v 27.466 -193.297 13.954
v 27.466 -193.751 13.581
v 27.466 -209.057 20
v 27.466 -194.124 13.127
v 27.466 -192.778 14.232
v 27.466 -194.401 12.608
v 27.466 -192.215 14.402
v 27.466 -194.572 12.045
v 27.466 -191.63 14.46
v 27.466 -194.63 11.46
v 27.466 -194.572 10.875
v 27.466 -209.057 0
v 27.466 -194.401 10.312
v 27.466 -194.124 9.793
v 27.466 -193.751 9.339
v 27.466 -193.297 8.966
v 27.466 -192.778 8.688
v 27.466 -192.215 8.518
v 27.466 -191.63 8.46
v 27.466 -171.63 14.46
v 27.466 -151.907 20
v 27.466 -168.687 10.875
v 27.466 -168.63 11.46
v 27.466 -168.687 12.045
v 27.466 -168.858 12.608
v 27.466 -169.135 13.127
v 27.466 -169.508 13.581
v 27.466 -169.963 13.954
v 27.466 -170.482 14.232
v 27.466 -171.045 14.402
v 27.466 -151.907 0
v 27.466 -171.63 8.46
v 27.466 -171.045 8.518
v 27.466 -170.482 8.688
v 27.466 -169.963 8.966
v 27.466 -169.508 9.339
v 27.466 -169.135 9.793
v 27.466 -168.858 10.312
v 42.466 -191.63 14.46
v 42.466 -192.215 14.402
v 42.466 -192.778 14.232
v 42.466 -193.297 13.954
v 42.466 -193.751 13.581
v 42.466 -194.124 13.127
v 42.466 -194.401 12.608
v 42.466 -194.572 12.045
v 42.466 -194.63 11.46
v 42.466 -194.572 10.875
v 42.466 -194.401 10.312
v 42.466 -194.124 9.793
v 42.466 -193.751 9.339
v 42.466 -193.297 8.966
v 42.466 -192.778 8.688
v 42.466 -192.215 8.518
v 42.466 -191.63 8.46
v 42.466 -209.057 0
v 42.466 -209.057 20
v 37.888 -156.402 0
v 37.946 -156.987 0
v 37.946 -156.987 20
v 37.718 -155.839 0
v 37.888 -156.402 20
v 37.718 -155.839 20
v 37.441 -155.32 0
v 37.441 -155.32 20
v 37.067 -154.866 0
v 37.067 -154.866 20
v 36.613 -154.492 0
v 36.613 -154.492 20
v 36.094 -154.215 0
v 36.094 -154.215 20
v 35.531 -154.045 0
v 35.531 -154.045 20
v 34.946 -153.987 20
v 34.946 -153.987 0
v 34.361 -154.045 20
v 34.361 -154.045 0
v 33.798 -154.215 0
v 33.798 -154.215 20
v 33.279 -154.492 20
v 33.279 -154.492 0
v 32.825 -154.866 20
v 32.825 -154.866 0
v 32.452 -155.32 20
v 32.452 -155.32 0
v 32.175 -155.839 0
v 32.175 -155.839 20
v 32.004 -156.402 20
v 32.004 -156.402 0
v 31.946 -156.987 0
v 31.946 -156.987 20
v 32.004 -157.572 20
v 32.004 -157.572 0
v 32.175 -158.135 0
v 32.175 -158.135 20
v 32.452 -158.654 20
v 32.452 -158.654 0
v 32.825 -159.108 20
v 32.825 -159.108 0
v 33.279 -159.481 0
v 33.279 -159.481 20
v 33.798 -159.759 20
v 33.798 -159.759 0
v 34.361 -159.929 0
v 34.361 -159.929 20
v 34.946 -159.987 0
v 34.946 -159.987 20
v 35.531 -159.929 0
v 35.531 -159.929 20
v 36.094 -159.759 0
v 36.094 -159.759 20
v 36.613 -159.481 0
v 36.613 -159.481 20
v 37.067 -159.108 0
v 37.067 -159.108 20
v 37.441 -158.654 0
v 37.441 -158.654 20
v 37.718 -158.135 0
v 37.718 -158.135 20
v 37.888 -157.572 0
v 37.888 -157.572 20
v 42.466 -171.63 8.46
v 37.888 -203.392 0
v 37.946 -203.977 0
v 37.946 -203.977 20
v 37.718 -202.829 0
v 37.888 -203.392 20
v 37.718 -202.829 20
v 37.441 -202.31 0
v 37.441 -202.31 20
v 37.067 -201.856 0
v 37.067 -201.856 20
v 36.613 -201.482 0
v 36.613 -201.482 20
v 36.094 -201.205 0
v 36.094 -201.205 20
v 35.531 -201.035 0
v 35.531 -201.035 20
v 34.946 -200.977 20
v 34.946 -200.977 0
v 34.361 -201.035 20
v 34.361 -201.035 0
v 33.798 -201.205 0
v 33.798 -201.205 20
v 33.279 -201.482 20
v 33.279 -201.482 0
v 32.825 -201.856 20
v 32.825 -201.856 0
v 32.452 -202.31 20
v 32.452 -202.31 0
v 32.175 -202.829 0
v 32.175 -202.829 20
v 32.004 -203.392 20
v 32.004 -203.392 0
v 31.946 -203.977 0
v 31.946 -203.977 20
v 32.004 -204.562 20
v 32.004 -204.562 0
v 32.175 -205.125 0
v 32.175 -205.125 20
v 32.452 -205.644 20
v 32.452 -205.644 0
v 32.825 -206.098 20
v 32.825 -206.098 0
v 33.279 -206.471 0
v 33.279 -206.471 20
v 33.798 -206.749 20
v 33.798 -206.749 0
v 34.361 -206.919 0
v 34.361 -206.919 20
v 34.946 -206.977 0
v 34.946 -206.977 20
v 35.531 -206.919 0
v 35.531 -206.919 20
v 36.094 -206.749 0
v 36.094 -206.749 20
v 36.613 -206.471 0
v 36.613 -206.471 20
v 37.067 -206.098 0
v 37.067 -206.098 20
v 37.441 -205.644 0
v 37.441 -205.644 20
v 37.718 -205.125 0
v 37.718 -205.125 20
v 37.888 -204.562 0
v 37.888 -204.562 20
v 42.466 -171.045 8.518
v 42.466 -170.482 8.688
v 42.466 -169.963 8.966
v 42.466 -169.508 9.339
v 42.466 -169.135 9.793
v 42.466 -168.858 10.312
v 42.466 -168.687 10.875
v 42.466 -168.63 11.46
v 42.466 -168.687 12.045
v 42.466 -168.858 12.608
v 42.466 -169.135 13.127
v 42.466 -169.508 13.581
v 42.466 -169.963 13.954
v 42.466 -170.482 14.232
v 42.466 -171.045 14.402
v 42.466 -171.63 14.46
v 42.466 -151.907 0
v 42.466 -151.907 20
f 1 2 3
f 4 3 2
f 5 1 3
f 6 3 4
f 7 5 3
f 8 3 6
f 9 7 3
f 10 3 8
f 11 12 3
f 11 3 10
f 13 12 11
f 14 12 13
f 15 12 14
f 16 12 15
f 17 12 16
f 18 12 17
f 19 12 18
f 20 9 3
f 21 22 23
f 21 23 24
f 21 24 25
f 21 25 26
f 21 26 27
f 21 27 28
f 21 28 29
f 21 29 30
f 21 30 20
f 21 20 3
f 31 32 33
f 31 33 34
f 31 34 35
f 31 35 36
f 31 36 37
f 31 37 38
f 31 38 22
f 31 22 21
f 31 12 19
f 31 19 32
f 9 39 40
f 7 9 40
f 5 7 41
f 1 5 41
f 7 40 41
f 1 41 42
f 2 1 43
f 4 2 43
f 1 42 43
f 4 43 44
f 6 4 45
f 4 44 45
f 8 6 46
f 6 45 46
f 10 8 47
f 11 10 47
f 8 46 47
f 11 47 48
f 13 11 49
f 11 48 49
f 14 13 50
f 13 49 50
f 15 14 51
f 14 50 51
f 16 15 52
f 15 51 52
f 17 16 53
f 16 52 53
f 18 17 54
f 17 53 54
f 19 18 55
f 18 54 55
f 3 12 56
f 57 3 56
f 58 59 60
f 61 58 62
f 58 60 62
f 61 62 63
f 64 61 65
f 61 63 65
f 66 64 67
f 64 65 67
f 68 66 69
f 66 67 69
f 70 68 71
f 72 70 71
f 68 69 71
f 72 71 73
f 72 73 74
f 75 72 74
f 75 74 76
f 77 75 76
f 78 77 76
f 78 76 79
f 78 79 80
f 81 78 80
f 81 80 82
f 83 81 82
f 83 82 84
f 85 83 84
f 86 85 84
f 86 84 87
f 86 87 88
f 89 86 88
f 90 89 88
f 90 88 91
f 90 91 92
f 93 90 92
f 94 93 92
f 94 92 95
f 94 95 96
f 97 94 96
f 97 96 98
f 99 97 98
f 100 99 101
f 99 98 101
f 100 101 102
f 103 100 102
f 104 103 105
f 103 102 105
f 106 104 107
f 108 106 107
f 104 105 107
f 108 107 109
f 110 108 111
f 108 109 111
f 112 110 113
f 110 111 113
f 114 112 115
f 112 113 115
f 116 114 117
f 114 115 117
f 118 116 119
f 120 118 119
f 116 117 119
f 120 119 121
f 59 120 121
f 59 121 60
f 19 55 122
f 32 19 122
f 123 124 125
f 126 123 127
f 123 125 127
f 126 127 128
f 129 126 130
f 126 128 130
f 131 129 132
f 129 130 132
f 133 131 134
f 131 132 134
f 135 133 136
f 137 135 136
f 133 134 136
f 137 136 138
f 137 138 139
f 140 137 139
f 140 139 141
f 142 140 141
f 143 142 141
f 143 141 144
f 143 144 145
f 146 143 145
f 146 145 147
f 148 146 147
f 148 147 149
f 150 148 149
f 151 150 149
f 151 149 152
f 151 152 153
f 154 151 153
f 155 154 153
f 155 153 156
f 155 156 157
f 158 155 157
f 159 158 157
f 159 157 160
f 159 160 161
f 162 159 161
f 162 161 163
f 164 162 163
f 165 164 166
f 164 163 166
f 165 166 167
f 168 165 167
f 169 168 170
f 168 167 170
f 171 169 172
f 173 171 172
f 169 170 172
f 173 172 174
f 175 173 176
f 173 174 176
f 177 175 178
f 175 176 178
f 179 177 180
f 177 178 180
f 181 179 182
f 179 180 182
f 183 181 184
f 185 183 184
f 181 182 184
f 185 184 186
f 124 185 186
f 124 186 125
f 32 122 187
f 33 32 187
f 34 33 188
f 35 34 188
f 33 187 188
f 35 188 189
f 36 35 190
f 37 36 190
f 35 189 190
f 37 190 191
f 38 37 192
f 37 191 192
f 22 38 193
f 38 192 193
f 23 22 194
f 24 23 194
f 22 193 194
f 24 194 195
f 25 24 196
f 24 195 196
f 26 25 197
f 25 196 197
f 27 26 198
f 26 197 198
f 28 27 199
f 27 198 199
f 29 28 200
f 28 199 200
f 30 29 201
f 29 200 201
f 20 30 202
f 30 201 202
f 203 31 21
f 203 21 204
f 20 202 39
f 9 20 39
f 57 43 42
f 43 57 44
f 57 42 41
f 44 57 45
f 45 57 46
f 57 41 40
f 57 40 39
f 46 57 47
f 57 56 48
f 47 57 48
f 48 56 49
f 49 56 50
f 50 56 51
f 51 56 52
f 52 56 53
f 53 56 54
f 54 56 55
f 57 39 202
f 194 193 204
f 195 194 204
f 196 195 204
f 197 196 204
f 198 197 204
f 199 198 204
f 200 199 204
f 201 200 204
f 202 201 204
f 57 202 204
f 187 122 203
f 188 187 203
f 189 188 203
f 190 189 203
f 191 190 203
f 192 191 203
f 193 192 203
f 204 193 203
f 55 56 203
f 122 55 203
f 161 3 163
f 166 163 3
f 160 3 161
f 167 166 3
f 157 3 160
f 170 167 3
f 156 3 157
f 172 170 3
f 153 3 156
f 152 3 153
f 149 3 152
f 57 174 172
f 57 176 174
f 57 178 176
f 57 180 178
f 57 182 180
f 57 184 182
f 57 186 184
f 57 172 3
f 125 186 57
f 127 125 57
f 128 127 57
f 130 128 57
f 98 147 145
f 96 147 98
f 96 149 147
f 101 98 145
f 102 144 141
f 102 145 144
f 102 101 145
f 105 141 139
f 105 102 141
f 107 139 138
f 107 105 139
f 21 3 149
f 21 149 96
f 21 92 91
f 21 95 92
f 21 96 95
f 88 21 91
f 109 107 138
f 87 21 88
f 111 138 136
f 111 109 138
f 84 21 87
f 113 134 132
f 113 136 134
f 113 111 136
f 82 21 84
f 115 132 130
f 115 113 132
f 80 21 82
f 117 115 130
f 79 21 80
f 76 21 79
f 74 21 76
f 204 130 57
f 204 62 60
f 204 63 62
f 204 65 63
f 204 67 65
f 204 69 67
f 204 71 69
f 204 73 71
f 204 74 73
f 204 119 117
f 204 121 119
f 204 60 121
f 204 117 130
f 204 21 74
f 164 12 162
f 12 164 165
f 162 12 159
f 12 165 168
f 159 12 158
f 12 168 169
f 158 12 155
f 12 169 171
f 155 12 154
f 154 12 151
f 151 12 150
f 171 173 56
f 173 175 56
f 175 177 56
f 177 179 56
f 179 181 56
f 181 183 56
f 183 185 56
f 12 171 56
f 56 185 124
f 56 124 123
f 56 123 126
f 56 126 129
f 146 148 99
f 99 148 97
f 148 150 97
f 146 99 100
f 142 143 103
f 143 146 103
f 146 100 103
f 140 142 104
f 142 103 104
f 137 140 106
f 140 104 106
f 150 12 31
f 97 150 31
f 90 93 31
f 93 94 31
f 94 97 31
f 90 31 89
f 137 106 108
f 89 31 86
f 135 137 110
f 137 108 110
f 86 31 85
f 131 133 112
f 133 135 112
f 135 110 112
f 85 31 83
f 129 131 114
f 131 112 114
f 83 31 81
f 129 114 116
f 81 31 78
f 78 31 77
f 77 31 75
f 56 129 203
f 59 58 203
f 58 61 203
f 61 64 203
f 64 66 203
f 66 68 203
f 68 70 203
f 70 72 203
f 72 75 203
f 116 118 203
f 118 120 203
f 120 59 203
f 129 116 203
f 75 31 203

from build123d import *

# Parameters (mm, degrees)
SKETCH1_W                    = 15
SKETCH1_H                    = 57.15
BOSS_EXTRUDE1_DEPTH          = 20
F_6_0_6_DIAMETER_HOLE1_D     = 6
F_6_0_6_DIAMETER_HOLE1_DEPTH = 24
F_6_0_6_DIAMETER_HOLE1_TIP   = 1.802581857
CUT_EXTRUDE1_DEPTH           = 211.546449087


with BuildPart() as part:
    # Sketch1 → Boss-Extrude1 (new body)
    with BuildSketch(Plane.XY):
        with Locations((34.966141976, -180.481947321)):
            Rectangle(SKETCH1_W, SKETCH1_H)
    extrude(amount=BOSS_EXTRUDE1_DEPTH)

    # Ø6.0 (6) Diameter Hole1
    with Locations(Plane(origin=(0, 0, 0), x_dir=(-1, 0, 0), z_dir=(0, 0, -1))):
        with Locations((-34.946141976, -156.986877707), (-34.946141976, -203.976877703)):
            Hole(F_6_0_6_DIAMETER_HOLE1_D / 2, depth=F_6_0_6_DIAMETER_HOLE1_DEPTH)
            with Locations((0, 0, -(F_6_0_6_DIAMETER_HOLE1_DEPTH + F_6_0_6_DIAMETER_HOLE1_TIP / 2))):  # 118° drill point
                Cone(0, F_6_0_6_DIAMETER_HOLE1_D / 2, F_6_0_6_DIAMETER_HOLE1_TIP, mode=Mode.SUBTRACT)

    # Sketch5 → Cut-Extrude1 (cut, through all)
    with BuildSketch(Plane(origin=(42.466141976, 0, 0), x_dir=(0, 0, -1), z_dir=(1, 0, 0))):
        with BuildLine():
            Line((-14.46, -171.629796136), (-14.46, -191.629796136))
            ThreePointArc((-14.46, -191.629796136), (-11.46, -194.629796136), (-8.46, -191.629796136))
            Line((-8.46, -191.629796136), (-8.46, -171.629796136))
            ThreePointArc((-8.46, -171.629796136), (-11.46, -168.629796136), (-14.46, -171.629796136))
        make_face()
    extrude(amount=-CUT_EXTRUDE1_DEPTH, mode=Mode.SUBTRACT)


solid = part.part
